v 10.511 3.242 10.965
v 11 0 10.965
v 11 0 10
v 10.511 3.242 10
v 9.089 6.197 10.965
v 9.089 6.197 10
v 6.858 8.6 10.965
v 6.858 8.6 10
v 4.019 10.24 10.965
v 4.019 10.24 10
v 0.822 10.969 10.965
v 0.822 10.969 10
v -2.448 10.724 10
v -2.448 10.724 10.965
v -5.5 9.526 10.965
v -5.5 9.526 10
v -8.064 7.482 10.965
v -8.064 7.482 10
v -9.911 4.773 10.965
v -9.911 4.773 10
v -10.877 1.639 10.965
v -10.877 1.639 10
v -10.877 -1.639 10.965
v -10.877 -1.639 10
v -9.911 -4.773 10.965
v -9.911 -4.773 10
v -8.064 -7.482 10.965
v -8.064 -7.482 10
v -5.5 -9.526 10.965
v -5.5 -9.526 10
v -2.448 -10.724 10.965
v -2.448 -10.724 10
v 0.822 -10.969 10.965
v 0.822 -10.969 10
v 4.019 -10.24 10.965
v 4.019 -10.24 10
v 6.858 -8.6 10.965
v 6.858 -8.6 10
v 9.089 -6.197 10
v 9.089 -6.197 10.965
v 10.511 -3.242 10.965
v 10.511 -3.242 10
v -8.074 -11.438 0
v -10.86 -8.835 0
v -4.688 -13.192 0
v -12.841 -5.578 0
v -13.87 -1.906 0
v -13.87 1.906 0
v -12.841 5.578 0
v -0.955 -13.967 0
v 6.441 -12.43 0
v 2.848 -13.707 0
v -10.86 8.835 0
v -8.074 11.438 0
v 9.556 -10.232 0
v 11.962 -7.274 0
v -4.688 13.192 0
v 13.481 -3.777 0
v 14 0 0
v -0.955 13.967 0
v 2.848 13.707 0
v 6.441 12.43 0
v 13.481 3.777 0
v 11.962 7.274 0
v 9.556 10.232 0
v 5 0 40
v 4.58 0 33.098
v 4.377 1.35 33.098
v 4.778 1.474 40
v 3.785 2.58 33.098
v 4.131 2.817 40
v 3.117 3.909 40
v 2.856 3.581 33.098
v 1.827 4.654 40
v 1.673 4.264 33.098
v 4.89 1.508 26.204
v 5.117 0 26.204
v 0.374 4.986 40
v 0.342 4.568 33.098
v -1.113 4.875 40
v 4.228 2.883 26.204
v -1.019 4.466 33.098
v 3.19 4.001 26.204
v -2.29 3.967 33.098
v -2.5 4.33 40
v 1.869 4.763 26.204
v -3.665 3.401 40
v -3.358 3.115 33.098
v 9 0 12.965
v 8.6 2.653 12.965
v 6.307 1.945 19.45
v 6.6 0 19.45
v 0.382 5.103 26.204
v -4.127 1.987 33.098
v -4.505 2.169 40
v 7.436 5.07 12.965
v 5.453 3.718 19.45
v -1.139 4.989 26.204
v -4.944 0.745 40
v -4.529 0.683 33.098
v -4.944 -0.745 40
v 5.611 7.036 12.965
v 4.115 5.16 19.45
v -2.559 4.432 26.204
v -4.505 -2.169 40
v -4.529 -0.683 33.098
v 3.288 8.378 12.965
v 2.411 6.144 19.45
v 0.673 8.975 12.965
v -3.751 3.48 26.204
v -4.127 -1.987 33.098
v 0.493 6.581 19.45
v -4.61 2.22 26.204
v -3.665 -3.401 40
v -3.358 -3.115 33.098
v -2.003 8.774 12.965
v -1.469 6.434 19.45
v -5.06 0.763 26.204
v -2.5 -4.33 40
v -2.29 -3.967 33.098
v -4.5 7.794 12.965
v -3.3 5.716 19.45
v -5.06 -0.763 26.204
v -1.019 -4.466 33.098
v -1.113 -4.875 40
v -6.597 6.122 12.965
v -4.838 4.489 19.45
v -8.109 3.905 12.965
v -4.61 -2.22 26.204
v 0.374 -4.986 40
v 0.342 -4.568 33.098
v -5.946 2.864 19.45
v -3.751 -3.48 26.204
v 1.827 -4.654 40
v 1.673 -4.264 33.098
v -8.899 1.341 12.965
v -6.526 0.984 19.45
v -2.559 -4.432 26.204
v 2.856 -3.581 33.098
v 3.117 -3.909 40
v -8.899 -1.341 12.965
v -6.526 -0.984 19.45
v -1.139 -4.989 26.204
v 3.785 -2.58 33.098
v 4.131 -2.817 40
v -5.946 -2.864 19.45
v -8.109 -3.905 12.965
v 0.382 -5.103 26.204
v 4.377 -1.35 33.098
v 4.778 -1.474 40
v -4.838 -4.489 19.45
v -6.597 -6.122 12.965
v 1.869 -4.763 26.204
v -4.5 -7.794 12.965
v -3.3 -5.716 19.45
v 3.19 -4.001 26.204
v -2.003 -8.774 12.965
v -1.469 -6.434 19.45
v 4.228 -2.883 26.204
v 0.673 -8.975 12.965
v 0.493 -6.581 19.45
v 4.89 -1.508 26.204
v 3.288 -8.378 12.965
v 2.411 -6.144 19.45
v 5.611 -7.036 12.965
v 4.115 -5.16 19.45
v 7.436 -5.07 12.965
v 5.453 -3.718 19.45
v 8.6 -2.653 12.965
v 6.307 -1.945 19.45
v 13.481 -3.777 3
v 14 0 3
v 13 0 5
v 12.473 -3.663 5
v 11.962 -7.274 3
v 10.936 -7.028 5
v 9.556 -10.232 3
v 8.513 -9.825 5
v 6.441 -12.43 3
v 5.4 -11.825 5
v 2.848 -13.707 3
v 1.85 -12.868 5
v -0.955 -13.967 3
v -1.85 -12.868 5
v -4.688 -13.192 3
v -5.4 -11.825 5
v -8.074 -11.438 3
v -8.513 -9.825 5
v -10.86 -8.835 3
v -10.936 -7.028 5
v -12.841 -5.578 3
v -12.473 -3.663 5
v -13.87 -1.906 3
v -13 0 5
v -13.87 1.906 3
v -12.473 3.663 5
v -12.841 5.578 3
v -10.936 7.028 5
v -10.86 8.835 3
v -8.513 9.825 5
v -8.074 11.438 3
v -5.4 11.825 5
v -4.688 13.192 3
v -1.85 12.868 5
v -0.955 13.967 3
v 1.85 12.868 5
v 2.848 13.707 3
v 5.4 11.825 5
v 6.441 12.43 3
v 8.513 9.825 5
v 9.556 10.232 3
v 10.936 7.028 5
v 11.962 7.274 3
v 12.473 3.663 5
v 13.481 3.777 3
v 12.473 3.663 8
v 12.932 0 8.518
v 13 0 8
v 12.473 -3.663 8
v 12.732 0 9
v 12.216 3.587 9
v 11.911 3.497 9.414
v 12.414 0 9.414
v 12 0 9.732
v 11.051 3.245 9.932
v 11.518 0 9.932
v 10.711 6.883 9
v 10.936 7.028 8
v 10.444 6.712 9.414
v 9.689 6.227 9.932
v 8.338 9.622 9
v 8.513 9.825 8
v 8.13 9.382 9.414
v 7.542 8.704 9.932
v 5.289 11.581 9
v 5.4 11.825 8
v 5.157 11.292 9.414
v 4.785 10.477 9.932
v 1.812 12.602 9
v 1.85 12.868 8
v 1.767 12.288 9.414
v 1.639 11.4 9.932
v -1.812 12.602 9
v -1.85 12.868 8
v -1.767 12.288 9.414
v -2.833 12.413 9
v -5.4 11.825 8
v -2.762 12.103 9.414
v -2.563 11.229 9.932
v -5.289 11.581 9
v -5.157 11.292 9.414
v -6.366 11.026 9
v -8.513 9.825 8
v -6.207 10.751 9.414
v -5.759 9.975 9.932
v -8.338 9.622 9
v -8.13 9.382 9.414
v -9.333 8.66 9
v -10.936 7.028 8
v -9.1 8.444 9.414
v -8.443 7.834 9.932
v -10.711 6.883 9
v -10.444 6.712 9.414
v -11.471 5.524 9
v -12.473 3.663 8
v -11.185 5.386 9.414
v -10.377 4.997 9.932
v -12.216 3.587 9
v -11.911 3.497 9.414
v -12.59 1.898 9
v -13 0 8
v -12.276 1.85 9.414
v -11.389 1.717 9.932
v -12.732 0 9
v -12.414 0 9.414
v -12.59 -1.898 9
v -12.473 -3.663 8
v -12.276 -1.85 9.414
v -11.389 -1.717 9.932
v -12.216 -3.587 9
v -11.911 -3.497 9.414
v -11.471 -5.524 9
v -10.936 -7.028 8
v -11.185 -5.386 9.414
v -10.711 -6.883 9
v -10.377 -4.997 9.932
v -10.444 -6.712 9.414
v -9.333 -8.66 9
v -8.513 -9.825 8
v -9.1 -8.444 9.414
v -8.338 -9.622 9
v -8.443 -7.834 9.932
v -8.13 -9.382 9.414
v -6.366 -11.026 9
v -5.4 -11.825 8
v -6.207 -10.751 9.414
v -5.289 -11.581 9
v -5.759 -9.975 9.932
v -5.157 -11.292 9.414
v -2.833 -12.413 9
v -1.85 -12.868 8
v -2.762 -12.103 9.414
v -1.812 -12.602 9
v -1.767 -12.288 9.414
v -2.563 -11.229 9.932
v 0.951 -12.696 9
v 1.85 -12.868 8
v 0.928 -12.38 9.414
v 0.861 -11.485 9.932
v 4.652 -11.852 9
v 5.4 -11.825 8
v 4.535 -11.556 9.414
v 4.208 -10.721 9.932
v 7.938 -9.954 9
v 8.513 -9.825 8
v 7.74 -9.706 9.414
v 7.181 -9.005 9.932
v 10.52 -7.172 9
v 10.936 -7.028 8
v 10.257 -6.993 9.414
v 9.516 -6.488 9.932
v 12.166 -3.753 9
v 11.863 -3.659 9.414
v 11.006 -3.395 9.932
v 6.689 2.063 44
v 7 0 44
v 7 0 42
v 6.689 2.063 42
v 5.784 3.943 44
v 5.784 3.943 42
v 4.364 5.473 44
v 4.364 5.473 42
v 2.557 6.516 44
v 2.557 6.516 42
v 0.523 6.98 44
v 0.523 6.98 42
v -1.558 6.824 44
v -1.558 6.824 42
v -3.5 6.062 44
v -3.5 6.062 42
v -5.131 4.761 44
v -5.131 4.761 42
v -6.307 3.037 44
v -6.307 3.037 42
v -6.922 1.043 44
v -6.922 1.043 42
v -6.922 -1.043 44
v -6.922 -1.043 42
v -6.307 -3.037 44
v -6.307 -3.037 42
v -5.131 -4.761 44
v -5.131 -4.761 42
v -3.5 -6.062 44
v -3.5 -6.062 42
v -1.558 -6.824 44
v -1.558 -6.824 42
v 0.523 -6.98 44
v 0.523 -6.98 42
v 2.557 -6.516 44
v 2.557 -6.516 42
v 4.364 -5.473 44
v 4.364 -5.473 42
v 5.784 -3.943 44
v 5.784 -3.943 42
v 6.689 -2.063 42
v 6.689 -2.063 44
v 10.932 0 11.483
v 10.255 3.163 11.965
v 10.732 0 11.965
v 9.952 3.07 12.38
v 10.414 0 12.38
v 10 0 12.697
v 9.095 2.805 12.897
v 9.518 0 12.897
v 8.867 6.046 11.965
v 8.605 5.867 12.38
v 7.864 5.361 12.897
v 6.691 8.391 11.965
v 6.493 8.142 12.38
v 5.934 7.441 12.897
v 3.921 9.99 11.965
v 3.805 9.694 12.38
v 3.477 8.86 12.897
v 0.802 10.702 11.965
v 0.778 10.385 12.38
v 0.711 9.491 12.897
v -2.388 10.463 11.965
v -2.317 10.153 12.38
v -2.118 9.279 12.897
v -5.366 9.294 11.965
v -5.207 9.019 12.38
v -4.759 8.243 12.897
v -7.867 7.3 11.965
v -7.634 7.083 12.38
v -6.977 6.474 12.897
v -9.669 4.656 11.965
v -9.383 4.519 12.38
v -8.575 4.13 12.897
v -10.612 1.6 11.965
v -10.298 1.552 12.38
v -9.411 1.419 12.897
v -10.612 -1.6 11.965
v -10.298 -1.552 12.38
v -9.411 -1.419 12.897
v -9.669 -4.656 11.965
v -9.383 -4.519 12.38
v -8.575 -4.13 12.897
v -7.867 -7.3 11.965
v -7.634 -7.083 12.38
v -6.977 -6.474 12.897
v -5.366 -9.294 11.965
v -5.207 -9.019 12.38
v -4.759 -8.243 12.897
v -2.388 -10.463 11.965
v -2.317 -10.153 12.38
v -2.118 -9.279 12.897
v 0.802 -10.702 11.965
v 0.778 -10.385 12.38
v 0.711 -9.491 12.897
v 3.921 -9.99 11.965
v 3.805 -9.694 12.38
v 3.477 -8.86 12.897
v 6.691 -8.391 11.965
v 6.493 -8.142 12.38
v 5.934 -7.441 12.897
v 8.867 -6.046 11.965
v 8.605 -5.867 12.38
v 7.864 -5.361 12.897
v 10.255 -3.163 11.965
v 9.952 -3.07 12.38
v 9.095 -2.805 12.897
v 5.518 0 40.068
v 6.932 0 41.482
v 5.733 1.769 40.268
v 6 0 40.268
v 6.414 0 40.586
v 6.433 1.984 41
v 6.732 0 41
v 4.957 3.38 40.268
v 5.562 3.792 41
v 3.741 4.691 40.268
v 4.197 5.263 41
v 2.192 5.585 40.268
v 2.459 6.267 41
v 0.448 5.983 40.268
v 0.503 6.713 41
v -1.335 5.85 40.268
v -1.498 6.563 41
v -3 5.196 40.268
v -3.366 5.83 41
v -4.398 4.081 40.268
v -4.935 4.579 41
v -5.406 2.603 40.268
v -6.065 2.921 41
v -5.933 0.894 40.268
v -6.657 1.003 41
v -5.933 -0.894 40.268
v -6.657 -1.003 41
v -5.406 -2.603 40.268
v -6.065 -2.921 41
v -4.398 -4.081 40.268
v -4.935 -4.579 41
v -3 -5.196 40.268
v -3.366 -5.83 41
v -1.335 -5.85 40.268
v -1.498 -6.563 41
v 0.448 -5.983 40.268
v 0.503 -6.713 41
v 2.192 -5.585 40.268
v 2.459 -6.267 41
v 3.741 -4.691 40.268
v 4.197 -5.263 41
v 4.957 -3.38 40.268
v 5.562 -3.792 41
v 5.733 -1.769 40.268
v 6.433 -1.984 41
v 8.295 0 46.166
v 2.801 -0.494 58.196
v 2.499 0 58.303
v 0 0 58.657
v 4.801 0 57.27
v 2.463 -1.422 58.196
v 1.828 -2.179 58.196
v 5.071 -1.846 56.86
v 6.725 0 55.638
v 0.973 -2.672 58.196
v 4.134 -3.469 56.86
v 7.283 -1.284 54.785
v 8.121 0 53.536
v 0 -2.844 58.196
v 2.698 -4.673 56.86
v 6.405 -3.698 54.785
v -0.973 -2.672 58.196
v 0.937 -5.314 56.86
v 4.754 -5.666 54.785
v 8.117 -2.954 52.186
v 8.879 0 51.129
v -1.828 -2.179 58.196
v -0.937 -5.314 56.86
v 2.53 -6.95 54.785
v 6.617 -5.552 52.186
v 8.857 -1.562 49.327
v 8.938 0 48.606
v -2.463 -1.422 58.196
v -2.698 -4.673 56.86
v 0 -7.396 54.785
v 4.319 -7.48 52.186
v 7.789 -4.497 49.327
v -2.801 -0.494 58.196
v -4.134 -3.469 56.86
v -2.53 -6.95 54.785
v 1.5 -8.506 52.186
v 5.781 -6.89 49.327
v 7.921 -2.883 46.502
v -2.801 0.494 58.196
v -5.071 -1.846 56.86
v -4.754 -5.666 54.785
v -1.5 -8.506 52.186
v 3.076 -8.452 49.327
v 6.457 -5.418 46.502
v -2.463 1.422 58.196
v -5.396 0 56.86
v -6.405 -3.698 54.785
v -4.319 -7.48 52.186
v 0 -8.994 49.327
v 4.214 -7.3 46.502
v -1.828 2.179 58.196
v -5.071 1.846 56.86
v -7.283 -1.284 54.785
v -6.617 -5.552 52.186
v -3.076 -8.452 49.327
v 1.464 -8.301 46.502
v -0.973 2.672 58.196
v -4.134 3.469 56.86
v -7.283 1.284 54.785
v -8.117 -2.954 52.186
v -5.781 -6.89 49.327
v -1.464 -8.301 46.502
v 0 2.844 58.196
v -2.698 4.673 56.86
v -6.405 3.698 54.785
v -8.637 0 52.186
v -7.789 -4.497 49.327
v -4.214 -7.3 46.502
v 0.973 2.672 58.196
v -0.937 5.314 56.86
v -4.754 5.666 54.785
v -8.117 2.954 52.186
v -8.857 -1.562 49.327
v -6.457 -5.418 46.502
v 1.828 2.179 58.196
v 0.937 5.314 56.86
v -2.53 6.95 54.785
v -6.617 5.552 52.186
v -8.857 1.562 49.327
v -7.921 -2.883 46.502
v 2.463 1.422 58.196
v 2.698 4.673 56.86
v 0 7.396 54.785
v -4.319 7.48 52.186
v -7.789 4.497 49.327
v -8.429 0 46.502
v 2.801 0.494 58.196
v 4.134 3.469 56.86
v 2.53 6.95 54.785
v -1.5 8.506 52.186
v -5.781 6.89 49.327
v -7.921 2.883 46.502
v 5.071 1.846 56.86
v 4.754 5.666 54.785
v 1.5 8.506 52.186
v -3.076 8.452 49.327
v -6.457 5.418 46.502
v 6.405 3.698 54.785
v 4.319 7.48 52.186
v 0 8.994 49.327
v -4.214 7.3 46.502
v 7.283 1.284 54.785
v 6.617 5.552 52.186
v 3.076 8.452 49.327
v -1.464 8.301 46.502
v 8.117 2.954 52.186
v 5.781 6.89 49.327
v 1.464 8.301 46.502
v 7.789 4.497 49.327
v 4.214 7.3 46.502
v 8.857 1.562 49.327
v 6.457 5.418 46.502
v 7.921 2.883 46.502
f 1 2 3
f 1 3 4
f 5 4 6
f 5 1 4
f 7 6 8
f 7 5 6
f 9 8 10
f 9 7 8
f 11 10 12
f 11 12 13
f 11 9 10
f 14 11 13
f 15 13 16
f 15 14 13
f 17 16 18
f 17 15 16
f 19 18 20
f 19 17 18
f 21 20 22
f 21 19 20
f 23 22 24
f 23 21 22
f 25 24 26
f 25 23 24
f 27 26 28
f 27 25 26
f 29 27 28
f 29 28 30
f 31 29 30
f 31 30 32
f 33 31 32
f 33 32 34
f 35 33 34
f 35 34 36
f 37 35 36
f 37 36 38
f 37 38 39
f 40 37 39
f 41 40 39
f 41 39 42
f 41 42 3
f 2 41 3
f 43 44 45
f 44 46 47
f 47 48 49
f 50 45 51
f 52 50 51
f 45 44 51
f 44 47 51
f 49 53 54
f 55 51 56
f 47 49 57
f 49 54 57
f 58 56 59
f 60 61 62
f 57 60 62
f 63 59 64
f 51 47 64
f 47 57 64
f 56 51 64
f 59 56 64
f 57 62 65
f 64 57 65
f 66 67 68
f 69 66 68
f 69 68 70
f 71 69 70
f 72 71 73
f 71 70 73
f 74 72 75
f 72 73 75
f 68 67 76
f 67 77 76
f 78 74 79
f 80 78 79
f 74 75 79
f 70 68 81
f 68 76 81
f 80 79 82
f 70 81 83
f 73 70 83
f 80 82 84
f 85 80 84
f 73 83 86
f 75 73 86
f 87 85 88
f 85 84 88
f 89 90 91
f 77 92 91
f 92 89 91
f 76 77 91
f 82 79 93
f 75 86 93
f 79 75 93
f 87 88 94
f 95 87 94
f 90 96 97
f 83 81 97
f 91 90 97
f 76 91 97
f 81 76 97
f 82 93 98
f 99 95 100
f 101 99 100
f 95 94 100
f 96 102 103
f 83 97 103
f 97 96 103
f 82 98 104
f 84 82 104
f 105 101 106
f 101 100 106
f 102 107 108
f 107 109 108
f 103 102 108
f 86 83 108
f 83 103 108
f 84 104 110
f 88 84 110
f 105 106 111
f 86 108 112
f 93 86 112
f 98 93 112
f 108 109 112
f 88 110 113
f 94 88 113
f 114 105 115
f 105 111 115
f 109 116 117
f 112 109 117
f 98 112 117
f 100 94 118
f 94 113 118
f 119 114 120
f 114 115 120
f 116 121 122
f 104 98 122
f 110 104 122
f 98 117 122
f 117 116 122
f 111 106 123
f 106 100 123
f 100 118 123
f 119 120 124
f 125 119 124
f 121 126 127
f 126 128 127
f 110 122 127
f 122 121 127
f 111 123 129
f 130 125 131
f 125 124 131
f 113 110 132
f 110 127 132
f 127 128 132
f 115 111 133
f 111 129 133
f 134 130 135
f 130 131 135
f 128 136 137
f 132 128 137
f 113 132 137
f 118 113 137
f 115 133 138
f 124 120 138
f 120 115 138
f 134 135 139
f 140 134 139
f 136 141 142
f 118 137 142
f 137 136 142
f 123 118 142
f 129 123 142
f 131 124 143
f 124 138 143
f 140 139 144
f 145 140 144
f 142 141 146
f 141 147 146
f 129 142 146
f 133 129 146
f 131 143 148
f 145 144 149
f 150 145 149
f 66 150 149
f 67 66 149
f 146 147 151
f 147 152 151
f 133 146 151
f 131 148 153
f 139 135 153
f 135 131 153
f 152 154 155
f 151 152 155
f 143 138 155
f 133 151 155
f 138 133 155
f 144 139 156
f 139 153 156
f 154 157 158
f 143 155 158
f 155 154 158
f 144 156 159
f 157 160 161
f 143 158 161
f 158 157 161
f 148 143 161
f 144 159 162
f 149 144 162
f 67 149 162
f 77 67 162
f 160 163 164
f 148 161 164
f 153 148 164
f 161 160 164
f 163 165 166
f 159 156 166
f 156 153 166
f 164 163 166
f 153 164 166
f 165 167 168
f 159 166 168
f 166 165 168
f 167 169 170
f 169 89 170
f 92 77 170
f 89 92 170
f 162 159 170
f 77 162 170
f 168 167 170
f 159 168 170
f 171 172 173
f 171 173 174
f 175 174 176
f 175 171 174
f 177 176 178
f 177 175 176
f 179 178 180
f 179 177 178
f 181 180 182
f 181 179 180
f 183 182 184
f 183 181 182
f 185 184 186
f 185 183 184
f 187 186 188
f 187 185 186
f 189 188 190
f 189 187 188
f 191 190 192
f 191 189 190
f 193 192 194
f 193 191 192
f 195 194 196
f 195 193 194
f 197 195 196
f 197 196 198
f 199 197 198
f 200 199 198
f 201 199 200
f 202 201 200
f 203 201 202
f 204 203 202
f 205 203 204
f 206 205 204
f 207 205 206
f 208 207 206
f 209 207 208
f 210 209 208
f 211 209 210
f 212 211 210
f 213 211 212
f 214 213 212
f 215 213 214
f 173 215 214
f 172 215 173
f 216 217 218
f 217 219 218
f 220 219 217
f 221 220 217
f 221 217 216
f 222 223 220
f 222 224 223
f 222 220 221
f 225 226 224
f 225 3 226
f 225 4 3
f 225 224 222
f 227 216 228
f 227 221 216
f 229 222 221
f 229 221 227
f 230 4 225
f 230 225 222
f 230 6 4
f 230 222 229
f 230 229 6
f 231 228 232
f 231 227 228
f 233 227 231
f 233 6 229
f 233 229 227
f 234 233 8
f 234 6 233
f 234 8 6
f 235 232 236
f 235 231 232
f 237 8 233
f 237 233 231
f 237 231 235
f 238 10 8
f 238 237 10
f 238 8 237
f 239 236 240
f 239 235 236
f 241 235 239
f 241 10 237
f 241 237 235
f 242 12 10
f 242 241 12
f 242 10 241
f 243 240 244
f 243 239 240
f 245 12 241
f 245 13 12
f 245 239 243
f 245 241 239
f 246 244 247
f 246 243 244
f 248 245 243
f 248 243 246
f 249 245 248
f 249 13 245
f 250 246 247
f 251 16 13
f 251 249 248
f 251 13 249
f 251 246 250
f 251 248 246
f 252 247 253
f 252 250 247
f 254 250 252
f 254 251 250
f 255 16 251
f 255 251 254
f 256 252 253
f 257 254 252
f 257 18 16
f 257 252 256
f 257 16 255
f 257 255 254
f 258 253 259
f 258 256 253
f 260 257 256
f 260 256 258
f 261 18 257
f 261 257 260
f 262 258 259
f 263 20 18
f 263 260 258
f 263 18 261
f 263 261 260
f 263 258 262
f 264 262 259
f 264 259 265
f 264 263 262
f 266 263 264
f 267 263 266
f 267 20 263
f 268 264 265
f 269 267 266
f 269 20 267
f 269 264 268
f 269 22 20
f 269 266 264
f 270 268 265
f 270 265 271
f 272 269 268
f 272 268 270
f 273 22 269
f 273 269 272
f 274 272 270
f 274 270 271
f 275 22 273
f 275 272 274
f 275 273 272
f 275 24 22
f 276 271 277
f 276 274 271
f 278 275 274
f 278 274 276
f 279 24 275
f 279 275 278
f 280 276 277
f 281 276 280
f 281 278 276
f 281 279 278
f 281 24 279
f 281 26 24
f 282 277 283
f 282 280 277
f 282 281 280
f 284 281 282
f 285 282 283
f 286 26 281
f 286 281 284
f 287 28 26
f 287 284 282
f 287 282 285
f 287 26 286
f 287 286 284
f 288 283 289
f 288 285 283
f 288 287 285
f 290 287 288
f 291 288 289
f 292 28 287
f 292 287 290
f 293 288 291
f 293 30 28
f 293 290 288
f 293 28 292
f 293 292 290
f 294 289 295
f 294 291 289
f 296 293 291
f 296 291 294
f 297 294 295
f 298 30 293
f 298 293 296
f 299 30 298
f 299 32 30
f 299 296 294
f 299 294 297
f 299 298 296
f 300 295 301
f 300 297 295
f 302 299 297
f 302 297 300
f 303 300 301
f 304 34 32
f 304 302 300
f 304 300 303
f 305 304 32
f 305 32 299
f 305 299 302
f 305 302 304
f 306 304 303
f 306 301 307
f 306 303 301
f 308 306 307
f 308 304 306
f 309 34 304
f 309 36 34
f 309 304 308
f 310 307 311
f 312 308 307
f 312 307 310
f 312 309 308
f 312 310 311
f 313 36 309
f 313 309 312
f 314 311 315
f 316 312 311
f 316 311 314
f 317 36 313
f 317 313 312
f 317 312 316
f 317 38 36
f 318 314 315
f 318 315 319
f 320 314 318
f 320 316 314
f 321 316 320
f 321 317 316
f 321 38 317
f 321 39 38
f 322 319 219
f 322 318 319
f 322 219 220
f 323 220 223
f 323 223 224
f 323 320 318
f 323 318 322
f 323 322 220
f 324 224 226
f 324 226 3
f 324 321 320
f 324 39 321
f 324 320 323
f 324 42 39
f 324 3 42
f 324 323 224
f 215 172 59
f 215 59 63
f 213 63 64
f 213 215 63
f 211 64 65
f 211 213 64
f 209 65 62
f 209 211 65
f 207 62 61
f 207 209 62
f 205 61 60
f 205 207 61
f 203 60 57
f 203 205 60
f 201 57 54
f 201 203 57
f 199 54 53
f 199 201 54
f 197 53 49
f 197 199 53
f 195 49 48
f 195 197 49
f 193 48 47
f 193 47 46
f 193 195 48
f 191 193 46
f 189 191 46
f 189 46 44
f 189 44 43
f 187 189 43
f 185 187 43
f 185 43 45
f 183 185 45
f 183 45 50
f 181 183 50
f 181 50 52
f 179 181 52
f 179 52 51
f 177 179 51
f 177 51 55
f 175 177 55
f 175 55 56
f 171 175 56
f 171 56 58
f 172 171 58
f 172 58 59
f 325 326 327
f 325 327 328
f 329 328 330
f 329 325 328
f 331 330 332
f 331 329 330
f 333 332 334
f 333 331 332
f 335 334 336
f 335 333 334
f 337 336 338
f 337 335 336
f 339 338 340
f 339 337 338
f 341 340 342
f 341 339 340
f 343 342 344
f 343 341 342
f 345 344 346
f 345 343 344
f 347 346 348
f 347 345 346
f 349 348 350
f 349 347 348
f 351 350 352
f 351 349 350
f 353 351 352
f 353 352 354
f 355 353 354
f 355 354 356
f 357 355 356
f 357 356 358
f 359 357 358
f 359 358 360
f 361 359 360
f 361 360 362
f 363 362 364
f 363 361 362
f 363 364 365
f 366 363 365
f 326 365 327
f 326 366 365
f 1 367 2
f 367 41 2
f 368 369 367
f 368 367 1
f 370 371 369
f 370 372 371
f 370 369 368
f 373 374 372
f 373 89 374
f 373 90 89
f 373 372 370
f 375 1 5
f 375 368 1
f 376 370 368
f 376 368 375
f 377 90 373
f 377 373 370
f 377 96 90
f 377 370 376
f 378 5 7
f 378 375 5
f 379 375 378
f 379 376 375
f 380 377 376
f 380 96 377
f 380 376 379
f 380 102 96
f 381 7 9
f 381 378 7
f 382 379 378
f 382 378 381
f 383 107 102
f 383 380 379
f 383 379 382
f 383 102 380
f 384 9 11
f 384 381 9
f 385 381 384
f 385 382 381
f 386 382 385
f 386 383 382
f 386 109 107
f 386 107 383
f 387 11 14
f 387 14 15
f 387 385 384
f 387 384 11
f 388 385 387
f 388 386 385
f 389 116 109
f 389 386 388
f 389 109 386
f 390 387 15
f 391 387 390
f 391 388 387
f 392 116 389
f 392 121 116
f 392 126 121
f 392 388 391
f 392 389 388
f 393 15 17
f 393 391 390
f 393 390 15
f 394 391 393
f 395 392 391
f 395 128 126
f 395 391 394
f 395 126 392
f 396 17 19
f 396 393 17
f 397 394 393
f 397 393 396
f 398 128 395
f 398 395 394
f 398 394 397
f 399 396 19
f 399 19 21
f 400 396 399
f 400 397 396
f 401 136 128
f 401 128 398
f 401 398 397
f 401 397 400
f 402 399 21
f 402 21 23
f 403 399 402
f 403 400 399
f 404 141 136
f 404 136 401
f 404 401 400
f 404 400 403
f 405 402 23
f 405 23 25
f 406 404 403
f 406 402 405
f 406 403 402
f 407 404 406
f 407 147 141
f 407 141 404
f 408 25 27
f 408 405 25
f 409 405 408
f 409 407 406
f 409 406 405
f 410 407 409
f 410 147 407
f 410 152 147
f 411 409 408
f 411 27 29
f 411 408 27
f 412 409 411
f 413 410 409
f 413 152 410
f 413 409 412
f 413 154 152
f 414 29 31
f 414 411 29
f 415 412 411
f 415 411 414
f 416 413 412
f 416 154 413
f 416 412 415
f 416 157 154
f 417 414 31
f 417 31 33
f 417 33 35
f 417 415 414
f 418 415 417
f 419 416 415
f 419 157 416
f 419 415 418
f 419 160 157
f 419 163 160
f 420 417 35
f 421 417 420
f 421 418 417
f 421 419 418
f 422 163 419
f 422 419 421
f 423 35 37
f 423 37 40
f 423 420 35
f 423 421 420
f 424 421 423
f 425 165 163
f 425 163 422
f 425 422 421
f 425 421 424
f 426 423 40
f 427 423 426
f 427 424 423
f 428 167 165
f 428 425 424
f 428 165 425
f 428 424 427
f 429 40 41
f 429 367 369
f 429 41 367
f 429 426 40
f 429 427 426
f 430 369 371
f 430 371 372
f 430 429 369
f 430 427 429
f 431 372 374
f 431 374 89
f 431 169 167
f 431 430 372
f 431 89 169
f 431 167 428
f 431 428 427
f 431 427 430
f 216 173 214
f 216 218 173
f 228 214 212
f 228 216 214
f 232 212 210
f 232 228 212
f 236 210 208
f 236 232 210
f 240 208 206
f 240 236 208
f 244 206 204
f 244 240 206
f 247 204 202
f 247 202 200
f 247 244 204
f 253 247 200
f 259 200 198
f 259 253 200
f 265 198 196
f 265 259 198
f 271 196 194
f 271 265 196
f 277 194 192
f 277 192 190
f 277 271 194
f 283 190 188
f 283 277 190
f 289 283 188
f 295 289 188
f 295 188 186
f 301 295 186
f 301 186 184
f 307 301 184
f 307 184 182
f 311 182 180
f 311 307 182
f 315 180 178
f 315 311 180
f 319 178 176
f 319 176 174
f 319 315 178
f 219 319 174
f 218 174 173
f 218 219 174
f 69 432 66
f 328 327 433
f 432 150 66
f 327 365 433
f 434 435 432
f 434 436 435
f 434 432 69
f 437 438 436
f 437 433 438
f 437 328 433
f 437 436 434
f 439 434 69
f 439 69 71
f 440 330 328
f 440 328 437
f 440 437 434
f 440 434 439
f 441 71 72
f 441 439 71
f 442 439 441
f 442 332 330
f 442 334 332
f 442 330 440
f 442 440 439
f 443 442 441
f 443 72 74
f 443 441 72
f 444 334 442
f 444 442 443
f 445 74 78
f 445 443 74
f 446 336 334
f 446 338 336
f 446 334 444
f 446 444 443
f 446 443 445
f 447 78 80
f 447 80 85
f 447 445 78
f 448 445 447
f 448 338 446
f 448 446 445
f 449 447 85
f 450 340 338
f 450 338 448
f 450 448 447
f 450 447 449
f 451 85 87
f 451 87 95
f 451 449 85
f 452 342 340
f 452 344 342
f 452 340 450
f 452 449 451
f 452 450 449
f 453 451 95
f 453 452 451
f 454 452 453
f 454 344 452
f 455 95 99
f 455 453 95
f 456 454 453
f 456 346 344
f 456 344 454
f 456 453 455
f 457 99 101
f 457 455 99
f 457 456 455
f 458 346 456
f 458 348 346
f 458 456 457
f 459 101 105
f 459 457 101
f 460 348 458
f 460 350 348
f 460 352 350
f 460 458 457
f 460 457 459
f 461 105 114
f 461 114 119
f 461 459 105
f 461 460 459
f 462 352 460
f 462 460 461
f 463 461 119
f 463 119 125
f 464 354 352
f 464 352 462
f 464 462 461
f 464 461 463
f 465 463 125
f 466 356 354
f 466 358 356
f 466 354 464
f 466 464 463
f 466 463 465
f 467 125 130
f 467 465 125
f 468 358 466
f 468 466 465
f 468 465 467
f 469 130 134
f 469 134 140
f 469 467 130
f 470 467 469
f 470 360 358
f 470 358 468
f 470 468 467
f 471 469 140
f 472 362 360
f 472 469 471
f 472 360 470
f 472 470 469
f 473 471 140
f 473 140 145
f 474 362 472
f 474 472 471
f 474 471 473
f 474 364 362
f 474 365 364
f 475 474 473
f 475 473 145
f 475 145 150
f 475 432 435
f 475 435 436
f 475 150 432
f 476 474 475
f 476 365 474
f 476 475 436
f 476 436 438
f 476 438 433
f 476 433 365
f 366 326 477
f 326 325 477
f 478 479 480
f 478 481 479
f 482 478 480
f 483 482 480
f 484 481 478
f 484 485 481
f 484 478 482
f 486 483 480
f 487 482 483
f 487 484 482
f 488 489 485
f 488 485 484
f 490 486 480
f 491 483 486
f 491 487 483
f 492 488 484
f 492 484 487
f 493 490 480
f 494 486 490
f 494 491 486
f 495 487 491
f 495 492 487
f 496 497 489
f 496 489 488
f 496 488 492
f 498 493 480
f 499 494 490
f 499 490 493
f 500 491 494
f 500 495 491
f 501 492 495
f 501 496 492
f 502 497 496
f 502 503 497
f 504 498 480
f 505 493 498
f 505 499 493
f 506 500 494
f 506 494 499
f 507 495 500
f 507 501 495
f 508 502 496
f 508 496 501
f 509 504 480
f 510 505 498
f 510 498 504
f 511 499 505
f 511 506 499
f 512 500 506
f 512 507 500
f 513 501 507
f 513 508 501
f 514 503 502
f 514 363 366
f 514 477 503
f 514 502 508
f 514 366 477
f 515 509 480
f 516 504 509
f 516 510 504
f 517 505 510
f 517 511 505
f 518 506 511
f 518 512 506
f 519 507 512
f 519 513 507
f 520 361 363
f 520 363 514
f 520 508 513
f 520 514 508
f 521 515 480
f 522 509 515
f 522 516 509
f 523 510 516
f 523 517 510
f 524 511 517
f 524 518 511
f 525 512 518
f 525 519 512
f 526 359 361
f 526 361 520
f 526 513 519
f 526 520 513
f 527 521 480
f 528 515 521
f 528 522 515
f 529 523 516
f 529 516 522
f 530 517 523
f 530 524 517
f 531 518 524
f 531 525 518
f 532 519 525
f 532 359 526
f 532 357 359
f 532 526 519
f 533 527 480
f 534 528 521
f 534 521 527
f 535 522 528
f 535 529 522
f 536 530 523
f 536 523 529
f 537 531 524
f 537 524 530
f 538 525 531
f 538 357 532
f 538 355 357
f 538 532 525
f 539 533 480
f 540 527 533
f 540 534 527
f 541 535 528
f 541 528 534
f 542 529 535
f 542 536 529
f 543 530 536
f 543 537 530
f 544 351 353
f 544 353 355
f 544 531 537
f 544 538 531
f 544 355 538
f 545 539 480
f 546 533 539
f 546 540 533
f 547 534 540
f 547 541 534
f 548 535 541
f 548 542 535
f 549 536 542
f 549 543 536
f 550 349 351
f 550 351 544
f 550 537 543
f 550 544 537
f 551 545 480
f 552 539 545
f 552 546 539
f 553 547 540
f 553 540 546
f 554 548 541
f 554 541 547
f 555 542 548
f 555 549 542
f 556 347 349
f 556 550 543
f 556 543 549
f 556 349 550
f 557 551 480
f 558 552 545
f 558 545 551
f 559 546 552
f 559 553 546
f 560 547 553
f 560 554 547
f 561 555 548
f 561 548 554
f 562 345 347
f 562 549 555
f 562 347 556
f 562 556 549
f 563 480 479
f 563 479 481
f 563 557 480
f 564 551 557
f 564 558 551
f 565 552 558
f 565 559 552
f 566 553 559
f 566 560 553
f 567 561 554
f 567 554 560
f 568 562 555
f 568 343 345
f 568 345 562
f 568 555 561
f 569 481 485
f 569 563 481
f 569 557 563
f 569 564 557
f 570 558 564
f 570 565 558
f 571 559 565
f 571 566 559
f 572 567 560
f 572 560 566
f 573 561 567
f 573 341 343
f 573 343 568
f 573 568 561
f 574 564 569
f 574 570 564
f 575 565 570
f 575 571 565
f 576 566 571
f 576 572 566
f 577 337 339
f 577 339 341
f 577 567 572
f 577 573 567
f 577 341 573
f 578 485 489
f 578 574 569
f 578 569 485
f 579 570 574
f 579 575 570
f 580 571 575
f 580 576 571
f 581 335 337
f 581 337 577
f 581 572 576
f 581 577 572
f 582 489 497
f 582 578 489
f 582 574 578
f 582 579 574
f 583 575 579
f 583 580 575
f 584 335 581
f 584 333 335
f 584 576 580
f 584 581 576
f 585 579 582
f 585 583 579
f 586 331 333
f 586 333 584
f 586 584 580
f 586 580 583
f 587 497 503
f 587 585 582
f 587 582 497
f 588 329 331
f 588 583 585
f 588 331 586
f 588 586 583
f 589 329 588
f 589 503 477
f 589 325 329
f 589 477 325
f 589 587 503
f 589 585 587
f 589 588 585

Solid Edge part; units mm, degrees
sketch "Sketch1" plane through (0, 0, 0) normal (0, -1, 0) x (1, 0, 0)
  arc A0 (11, 10.9653) -> (9, 12.9653) centre (9, 10.9653) ccw
  line L0 (11, 10) -> (11, 10.9653)
  arc A1 (13, 8) -> (11, 10) centre (11, 8) ccw
  line L1 (13, 5) -> (13, 8)
  line L2 (13, 5) -> (14, 3)
  line L3 (14, 0) -> (14, 3)
  line L4 (0, 0) -> (14, 0)
  line L5 (0, 0) -> (0, 59)
  line L6 (7, 42) -> (7, 44)
  arc A2 (5, 40) -> (7, 42) centre (5, 42) ccw
  arc A3 (5, 40) -> (9, 12.9653) centre (54.5786, 33.5223) ccw
  arc A4 (0, 58.6569) -> (7, 44) centre (0, 49.6569) cw
revolve "RevolvedProtrusion1" add sketch "Sketch1" angle 360 about axis through (0, 0, 0) along (0, 0, 1)
